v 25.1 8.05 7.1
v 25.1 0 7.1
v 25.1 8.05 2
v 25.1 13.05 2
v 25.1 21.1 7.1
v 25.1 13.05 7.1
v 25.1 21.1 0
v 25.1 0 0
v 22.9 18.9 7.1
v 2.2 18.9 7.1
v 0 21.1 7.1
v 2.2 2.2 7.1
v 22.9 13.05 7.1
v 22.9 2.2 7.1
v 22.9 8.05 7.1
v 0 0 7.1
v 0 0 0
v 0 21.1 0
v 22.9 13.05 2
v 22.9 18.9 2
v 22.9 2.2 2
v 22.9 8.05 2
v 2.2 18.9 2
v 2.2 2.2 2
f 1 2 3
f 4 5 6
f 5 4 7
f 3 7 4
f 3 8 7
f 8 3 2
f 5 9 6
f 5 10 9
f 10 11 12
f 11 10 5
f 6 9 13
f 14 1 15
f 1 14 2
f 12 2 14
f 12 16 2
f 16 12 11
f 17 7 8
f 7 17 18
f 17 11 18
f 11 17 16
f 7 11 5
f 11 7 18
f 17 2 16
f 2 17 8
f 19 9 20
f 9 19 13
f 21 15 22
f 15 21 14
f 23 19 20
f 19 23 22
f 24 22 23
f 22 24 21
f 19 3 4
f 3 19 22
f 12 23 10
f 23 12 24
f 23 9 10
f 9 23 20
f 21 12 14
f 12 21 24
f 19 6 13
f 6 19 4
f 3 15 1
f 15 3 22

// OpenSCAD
// Source-based FIT COUPON ONLY for active 8-ohm 2W 20x16x4.7mm
// Challenge Electronics CS20-02P110-04-1X. Original CC0 adapter.
// Not a speaker enclosure, soundbox, or proof of thermal/acoustic fit.
$fn=48;
part="speaker_rect_fit_gauge";
speaker_l=20;
speaker_w=16;
speaker_h=4.7;
speaker_fit_xy=0.35; // nominal each side, adjust only after a physical coupon
speaker_wall=2.2;
speaker_base=2.0;
module speaker_rect_fit_gauge() {
    pocket_l=speaker_l+2*speaker_fit_xy;
    pocket_w=speaker_w+2*speaker_fit_xy;
    outer_l=pocket_l+2*speaker_wall;
    outer_w=pocket_w+2*speaker_wall;
    total_h=speaker_base+speaker_h+0.4;
    assert(speaker_l==20 && speaker_w==16 && speaker_h>=4.7);
    assert(speaker_fit_xy>=0.2 && speaker_fit_xy<=0.8);
    difference() {
        cube([outer_l,outer_w,total_h]);
        // One rectangular test pocket, intentionally OPEN TOP.
        translate([speaker_wall,speaker_wall,speaker_base])
            cube([pocket_l,pocket_w,speaker_h+1]);
        // Wire solder-pad service notch. Connector routing is NOT final.
        translate([outer_l-speaker_wall-0.1,outer_w/2-2.5,speaker_base])
            cube([speaker_wall+0.2,5,speaker_h+1]);
    }
}
if(part=="speaker_rect_fit_gauge") speaker_rect_fit_gauge();
else assert(false,"Unknown fit part");
